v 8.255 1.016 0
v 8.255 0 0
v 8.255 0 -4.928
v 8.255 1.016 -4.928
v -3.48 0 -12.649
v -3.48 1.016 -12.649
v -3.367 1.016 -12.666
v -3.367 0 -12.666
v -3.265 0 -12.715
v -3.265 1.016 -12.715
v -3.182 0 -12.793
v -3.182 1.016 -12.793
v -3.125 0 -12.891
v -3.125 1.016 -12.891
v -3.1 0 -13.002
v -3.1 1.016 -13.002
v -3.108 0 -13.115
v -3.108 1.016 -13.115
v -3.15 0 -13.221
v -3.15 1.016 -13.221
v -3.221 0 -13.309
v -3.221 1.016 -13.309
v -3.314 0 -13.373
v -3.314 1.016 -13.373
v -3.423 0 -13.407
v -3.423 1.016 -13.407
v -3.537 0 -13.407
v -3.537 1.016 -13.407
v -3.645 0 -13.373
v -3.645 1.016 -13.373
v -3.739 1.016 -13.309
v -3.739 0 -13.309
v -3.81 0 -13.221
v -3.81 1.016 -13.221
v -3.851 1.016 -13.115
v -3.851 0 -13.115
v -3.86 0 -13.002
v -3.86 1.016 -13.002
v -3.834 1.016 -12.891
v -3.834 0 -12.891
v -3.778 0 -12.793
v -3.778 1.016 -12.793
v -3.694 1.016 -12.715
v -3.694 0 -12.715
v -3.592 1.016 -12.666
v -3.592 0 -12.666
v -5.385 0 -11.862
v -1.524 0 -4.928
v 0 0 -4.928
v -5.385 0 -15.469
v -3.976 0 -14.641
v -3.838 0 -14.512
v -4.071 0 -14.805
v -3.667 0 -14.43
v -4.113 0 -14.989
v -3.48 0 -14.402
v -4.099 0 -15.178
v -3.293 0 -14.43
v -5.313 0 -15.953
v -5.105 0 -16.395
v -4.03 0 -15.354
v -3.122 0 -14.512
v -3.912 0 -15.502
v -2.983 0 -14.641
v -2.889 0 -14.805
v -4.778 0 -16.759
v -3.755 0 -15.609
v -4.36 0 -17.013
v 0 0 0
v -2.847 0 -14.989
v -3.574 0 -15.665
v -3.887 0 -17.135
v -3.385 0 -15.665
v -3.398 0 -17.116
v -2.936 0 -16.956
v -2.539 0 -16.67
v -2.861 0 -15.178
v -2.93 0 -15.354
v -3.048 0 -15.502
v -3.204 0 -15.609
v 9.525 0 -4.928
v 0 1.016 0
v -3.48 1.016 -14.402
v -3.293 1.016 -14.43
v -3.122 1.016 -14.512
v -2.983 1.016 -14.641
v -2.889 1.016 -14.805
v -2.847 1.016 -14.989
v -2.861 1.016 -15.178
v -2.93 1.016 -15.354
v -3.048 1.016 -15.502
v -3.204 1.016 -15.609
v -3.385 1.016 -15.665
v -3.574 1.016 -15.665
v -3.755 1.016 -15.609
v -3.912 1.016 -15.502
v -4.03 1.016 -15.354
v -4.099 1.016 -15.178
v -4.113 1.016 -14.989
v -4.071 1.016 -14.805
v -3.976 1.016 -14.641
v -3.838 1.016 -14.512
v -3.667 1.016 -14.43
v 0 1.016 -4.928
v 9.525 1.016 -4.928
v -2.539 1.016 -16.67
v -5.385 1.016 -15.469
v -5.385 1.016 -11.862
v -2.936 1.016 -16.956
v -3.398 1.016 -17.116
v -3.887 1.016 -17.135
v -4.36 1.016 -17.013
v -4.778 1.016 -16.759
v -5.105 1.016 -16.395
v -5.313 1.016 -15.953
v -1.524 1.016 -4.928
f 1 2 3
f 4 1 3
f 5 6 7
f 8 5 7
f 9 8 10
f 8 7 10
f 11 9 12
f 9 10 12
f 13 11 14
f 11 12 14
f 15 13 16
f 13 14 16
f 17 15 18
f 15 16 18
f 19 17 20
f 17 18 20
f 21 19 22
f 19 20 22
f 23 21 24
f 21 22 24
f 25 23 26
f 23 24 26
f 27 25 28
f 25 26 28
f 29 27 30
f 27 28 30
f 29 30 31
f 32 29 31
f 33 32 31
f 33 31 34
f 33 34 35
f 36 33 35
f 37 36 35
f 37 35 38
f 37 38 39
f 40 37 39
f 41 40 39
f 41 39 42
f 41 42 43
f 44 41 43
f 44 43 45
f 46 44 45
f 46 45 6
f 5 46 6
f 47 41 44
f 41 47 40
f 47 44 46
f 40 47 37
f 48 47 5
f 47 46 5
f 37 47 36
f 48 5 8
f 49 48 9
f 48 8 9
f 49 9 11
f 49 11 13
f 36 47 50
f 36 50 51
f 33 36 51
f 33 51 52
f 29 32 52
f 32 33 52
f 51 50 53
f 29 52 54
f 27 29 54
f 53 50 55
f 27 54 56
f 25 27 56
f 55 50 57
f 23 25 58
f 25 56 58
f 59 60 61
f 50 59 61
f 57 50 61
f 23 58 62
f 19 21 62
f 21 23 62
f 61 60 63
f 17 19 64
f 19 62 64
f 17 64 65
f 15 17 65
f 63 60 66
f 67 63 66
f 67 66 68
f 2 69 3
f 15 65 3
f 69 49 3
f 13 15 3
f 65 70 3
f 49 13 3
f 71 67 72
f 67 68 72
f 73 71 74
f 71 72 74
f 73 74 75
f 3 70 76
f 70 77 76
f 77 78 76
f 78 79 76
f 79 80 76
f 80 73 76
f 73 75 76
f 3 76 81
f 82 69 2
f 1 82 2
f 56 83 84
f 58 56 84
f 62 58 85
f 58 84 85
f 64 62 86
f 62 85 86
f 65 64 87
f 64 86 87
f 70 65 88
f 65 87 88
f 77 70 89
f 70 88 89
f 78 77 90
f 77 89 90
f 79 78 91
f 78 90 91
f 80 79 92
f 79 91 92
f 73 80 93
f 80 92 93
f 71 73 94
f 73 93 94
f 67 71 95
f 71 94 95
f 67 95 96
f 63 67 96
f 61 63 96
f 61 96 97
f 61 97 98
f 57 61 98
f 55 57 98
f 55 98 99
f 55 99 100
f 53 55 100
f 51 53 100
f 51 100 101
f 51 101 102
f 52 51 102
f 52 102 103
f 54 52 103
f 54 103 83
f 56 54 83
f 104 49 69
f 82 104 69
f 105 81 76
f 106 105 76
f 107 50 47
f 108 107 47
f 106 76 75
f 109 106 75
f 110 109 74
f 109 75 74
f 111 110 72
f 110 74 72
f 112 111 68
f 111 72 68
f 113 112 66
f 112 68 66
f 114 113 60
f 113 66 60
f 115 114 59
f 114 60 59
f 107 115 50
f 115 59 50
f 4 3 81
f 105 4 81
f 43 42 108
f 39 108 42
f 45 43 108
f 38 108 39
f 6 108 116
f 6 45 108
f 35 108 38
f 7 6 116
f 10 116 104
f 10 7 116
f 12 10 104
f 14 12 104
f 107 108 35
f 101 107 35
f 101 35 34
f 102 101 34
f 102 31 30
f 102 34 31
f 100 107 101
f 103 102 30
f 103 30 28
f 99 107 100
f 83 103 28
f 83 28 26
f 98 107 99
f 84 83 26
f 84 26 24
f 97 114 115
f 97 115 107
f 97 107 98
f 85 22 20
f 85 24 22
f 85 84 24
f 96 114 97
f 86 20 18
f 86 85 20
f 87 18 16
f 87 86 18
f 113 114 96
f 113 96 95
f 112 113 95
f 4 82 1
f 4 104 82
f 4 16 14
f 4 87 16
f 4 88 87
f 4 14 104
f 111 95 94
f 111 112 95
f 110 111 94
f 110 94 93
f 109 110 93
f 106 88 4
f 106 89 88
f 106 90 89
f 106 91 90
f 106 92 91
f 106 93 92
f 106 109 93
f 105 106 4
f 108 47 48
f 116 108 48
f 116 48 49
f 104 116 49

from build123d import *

# Parameters (mm, degrees)
BOSS_EXTRUDE1_DEPTH = 1.016
SKETCH2_R           = 0.635
SKETCH2_R_2         = 0.381
CUT_EXTRUDE1_DEPTH  = 20.63947316


with BuildPart() as part:
    # Sketch1 → Boss-Extrude1 (new body)
    with BuildSketch(Plane(origin=(0, 0, 0), x_dir=(1, 0, 0), z_dir=(0, 1, 0))):
        with BuildLine():
            Line((0, 0), (8.255, 0))
            Line((8.255, 0), (8.255, 4.9276))
            Line((8.255, 4.9276), (9.525, 4.9276))
            Line((9.525, 4.9276), (-2.539137852, 16.669908865))
            ThreePointArc((-2.539137852, 16.669908865), (-4.360383855, 17.013020284), (-5.3848, 15.4686))
            Line((-5.3848, 15.4686), (-5.3848, 11.8618))
            Line((-5.3848, 11.8618), (-1.524, 4.9276))
            Line((-1.524, 4.9276), (0, 4.9276))
            Line((0, 4.9276), (0, 0))
        make_face()
    extrude(amount=BOSS_EXTRUDE1_DEPTH)

    # Sketch2 → Cut-Extrude1 (cut, through all)
    with BuildSketch(Plane(origin=(0, 1.016, 0), x_dir=(1, 0, 0), z_dir=(0, 1, 0))):
        with Locations(Location((-3.4798, 15.0368, 0), (0, 0, 270))):
            Circle(SKETCH2_R)
        with Locations(Location((-3.4798, 13.0302, 0), (0, 0, 270))):
            Circle(SKETCH2_R_2)
    extrude(amount=-CUT_EXTRUDE1_DEPTH, mode=Mode.SUBTRACT)


solid = part.part
